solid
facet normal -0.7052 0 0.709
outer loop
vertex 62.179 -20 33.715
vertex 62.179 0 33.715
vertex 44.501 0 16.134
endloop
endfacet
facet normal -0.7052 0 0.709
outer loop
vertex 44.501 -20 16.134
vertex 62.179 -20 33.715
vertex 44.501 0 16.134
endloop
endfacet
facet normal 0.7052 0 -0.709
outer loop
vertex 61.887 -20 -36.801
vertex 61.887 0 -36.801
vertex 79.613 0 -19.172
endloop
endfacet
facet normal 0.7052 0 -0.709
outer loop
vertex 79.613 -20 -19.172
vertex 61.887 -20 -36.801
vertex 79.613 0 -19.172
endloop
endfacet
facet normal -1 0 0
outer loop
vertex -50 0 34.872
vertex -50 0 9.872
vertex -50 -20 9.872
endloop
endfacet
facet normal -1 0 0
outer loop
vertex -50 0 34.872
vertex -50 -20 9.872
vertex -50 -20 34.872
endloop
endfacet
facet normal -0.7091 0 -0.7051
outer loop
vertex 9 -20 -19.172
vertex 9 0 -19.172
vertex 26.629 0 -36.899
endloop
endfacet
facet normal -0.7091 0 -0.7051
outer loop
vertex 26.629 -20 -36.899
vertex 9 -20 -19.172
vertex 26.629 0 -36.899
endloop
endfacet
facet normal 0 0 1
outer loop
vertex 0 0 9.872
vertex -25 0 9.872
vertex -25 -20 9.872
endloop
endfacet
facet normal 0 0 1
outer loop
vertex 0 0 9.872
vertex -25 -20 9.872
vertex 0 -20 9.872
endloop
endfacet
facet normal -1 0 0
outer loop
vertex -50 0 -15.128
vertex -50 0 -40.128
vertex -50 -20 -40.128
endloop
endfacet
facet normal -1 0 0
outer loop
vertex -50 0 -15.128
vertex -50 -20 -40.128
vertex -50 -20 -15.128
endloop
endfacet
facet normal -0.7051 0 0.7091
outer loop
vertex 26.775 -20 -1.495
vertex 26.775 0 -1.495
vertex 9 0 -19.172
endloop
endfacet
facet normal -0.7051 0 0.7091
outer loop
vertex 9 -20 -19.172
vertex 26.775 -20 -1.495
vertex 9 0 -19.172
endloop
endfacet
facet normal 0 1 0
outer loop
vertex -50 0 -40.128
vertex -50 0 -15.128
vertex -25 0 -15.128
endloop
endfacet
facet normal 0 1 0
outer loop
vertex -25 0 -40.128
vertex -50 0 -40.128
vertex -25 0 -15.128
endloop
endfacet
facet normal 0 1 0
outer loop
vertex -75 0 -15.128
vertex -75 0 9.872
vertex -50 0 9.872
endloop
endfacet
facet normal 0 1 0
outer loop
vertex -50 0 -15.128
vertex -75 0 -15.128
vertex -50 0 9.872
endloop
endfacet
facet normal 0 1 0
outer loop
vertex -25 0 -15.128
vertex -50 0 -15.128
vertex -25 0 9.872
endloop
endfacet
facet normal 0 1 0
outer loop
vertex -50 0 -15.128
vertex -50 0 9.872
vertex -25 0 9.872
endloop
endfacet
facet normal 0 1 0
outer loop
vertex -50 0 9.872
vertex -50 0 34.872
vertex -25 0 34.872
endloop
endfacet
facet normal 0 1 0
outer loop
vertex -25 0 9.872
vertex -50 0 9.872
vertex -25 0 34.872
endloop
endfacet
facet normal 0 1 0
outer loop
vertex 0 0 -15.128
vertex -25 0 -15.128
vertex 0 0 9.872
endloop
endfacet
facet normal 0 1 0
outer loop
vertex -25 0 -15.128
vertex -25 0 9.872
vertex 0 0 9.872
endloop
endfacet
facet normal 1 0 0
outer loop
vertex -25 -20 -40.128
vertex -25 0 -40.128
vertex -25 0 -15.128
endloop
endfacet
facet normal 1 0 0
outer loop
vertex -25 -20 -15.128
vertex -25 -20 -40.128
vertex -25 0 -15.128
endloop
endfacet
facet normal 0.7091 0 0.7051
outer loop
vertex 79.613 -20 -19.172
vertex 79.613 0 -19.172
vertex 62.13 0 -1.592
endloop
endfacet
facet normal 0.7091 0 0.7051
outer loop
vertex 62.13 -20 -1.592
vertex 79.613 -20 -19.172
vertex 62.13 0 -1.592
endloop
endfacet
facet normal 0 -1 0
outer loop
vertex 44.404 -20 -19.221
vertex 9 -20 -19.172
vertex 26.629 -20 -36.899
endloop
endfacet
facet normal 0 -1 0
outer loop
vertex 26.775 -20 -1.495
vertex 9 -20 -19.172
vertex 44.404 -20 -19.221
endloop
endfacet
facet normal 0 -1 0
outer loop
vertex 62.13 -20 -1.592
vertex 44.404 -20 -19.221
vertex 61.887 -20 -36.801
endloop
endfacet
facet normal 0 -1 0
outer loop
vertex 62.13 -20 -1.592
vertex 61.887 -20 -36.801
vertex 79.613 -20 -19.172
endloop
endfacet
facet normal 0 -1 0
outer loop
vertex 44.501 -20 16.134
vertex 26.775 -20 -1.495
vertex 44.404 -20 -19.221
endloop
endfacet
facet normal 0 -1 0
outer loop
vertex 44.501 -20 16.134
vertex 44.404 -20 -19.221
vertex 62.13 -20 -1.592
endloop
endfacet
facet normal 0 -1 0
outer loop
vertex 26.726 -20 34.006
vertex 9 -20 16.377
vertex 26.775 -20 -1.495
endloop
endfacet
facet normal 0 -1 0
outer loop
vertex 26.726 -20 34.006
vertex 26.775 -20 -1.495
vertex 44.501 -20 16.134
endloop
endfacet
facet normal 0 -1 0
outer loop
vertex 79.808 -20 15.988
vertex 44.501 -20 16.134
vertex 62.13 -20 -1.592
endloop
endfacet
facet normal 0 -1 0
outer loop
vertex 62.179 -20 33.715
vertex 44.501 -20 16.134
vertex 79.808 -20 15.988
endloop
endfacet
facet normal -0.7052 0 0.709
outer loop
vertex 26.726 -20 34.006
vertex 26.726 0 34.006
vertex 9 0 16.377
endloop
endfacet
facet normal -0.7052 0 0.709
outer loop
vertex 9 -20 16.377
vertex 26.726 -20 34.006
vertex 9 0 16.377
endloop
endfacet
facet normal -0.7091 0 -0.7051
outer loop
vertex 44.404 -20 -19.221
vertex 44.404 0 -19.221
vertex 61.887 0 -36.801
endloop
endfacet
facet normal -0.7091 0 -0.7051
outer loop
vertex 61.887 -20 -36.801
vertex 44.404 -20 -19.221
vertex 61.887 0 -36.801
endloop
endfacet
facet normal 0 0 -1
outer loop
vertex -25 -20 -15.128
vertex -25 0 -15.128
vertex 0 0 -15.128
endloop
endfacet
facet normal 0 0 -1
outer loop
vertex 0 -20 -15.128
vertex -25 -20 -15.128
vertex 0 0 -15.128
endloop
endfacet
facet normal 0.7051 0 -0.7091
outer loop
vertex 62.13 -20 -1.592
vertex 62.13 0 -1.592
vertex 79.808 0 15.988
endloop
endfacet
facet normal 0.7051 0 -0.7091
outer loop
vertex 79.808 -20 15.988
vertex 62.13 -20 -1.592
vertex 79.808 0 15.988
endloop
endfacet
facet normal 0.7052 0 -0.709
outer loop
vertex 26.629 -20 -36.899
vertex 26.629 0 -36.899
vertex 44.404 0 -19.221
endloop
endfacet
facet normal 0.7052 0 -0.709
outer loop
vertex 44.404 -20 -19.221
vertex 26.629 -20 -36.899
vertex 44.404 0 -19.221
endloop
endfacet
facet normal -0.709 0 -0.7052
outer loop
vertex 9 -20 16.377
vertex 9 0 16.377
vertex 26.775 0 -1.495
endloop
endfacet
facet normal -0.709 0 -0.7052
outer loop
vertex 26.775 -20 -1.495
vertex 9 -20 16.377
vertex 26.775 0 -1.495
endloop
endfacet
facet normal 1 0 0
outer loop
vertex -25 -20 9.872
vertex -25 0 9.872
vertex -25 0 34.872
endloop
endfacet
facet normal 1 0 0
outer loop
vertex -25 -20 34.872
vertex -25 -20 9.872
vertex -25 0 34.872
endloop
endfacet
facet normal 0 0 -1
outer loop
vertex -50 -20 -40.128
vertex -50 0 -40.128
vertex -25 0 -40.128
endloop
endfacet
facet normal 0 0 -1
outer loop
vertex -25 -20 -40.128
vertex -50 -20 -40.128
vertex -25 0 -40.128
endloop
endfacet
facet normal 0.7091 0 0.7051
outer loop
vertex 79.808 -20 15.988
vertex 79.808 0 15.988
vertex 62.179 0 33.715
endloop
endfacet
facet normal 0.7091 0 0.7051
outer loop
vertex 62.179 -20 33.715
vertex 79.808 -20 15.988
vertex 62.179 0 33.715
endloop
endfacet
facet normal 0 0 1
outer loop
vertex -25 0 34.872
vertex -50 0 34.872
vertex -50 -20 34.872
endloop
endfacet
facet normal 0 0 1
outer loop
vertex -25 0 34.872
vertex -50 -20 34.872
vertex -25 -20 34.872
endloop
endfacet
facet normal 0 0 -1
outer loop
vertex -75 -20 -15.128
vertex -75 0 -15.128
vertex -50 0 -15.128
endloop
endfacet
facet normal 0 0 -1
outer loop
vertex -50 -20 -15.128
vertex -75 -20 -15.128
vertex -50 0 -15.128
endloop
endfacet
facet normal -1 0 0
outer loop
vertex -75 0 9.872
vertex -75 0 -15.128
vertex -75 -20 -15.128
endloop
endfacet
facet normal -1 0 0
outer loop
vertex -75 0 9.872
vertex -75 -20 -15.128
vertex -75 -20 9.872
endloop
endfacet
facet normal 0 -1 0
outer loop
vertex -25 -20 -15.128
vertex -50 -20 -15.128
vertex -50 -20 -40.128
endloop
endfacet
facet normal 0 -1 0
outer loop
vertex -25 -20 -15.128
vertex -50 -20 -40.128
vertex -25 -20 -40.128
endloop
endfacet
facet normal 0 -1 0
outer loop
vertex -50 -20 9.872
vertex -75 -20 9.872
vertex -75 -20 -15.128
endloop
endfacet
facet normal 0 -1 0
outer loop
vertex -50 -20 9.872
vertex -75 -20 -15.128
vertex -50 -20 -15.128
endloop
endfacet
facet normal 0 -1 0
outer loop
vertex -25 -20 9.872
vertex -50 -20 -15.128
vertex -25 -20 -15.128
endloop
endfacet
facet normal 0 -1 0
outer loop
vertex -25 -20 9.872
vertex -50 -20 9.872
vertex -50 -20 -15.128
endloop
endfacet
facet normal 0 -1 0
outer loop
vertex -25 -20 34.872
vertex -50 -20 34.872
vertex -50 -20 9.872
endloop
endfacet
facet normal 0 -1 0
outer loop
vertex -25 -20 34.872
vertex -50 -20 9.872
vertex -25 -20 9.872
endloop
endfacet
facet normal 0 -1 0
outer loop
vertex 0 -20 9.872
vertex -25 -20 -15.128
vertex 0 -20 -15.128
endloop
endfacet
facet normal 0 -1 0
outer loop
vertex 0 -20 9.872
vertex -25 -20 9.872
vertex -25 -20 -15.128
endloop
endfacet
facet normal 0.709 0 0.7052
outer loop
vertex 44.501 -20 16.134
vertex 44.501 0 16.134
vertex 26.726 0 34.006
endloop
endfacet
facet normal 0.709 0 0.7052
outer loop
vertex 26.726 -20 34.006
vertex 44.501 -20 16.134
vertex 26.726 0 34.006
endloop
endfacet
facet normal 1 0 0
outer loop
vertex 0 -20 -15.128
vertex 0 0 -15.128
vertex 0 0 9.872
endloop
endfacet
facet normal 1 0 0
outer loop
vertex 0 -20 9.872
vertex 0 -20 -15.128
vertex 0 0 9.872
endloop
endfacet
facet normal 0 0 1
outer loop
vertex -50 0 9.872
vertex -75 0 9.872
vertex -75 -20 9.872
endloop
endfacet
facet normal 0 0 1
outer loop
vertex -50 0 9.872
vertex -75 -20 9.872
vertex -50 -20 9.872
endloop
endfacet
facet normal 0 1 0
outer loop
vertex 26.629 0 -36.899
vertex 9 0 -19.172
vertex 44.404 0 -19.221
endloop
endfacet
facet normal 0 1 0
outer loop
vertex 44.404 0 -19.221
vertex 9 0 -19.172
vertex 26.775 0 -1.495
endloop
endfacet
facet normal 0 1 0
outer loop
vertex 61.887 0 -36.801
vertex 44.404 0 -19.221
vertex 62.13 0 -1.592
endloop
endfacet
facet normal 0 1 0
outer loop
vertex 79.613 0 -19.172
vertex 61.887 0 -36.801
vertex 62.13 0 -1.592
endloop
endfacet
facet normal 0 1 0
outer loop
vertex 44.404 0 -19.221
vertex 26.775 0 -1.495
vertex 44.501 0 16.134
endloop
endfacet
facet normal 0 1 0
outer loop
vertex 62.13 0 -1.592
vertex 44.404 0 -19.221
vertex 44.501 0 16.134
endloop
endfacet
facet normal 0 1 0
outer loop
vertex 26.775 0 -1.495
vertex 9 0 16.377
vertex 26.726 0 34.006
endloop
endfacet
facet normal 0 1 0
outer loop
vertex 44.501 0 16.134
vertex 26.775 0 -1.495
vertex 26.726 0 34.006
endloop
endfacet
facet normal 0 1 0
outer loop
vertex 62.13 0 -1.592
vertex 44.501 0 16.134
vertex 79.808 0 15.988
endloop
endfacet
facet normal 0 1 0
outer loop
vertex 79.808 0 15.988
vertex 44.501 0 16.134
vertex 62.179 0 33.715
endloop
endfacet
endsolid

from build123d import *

# Parameters (mm, degrees)
F0_W     = 75
F0_H     = 25
F3_DEPTH = 20
F1_W     = 25
F1_H     = 75
F4_DEPTH = 20
F5_DEPTH = 20


with BuildPart() as f3:
    # F0 (on Front) → F3 (new body)
    with BuildSketch(Plane.XZ):
        with Locations((-37.5, -2.6279494166)):
            Rectangle(F0_W, F0_H)
    extrude(amount=F3_DEPTH)

    # F1 (on Front) → F4 (join)
    with BuildSketch(Plane.XZ):
        with Locations((-37.4999418855, -2.6280174498)):
            Rectangle(F1_W, F1_H)
    extrude(amount=F4_DEPTH)


with BuildPart() as f5:
    # F2 (on Front) → F5 (new body)
    with BuildSketch(Plane.XZ):
        Polygon((44.5007340238, 16.1337594985), (26.7262023028, 34.0062912639), (9.0000007387, 16.3772873751), (26.7745324597, -1.4952443902), align=None)
        Polygon((62.1786054309, 33.714698238), (44.5007340238, 16.1337594985), (62.1297379126, -1.5924420656), (79.8076093197, 15.9884966739), align=None)
        Polygon((62.1297379126, -1.5924420656), (44.5007340238, 16.1337594985), (26.7745324597, -1.4952443902), (44.4035363485, -19.2214459543), align=None)
        Polygon((79.6132139691, -19.1723134283), (62.1297379126, -1.5924420656), (44.4035363485, -19.2214459543), (61.887012405, -36.8013173171), align=None)
        Polygon((44.4035363485, -19.2214459543), (26.7745324597, -1.4952443902), (9.0000007387, -19.1723134283), (26.6290046275, -36.8985149924), align=None)
    extrude(amount=F5_DEPTH)


solid = Compound([f3.part, f5.part])
